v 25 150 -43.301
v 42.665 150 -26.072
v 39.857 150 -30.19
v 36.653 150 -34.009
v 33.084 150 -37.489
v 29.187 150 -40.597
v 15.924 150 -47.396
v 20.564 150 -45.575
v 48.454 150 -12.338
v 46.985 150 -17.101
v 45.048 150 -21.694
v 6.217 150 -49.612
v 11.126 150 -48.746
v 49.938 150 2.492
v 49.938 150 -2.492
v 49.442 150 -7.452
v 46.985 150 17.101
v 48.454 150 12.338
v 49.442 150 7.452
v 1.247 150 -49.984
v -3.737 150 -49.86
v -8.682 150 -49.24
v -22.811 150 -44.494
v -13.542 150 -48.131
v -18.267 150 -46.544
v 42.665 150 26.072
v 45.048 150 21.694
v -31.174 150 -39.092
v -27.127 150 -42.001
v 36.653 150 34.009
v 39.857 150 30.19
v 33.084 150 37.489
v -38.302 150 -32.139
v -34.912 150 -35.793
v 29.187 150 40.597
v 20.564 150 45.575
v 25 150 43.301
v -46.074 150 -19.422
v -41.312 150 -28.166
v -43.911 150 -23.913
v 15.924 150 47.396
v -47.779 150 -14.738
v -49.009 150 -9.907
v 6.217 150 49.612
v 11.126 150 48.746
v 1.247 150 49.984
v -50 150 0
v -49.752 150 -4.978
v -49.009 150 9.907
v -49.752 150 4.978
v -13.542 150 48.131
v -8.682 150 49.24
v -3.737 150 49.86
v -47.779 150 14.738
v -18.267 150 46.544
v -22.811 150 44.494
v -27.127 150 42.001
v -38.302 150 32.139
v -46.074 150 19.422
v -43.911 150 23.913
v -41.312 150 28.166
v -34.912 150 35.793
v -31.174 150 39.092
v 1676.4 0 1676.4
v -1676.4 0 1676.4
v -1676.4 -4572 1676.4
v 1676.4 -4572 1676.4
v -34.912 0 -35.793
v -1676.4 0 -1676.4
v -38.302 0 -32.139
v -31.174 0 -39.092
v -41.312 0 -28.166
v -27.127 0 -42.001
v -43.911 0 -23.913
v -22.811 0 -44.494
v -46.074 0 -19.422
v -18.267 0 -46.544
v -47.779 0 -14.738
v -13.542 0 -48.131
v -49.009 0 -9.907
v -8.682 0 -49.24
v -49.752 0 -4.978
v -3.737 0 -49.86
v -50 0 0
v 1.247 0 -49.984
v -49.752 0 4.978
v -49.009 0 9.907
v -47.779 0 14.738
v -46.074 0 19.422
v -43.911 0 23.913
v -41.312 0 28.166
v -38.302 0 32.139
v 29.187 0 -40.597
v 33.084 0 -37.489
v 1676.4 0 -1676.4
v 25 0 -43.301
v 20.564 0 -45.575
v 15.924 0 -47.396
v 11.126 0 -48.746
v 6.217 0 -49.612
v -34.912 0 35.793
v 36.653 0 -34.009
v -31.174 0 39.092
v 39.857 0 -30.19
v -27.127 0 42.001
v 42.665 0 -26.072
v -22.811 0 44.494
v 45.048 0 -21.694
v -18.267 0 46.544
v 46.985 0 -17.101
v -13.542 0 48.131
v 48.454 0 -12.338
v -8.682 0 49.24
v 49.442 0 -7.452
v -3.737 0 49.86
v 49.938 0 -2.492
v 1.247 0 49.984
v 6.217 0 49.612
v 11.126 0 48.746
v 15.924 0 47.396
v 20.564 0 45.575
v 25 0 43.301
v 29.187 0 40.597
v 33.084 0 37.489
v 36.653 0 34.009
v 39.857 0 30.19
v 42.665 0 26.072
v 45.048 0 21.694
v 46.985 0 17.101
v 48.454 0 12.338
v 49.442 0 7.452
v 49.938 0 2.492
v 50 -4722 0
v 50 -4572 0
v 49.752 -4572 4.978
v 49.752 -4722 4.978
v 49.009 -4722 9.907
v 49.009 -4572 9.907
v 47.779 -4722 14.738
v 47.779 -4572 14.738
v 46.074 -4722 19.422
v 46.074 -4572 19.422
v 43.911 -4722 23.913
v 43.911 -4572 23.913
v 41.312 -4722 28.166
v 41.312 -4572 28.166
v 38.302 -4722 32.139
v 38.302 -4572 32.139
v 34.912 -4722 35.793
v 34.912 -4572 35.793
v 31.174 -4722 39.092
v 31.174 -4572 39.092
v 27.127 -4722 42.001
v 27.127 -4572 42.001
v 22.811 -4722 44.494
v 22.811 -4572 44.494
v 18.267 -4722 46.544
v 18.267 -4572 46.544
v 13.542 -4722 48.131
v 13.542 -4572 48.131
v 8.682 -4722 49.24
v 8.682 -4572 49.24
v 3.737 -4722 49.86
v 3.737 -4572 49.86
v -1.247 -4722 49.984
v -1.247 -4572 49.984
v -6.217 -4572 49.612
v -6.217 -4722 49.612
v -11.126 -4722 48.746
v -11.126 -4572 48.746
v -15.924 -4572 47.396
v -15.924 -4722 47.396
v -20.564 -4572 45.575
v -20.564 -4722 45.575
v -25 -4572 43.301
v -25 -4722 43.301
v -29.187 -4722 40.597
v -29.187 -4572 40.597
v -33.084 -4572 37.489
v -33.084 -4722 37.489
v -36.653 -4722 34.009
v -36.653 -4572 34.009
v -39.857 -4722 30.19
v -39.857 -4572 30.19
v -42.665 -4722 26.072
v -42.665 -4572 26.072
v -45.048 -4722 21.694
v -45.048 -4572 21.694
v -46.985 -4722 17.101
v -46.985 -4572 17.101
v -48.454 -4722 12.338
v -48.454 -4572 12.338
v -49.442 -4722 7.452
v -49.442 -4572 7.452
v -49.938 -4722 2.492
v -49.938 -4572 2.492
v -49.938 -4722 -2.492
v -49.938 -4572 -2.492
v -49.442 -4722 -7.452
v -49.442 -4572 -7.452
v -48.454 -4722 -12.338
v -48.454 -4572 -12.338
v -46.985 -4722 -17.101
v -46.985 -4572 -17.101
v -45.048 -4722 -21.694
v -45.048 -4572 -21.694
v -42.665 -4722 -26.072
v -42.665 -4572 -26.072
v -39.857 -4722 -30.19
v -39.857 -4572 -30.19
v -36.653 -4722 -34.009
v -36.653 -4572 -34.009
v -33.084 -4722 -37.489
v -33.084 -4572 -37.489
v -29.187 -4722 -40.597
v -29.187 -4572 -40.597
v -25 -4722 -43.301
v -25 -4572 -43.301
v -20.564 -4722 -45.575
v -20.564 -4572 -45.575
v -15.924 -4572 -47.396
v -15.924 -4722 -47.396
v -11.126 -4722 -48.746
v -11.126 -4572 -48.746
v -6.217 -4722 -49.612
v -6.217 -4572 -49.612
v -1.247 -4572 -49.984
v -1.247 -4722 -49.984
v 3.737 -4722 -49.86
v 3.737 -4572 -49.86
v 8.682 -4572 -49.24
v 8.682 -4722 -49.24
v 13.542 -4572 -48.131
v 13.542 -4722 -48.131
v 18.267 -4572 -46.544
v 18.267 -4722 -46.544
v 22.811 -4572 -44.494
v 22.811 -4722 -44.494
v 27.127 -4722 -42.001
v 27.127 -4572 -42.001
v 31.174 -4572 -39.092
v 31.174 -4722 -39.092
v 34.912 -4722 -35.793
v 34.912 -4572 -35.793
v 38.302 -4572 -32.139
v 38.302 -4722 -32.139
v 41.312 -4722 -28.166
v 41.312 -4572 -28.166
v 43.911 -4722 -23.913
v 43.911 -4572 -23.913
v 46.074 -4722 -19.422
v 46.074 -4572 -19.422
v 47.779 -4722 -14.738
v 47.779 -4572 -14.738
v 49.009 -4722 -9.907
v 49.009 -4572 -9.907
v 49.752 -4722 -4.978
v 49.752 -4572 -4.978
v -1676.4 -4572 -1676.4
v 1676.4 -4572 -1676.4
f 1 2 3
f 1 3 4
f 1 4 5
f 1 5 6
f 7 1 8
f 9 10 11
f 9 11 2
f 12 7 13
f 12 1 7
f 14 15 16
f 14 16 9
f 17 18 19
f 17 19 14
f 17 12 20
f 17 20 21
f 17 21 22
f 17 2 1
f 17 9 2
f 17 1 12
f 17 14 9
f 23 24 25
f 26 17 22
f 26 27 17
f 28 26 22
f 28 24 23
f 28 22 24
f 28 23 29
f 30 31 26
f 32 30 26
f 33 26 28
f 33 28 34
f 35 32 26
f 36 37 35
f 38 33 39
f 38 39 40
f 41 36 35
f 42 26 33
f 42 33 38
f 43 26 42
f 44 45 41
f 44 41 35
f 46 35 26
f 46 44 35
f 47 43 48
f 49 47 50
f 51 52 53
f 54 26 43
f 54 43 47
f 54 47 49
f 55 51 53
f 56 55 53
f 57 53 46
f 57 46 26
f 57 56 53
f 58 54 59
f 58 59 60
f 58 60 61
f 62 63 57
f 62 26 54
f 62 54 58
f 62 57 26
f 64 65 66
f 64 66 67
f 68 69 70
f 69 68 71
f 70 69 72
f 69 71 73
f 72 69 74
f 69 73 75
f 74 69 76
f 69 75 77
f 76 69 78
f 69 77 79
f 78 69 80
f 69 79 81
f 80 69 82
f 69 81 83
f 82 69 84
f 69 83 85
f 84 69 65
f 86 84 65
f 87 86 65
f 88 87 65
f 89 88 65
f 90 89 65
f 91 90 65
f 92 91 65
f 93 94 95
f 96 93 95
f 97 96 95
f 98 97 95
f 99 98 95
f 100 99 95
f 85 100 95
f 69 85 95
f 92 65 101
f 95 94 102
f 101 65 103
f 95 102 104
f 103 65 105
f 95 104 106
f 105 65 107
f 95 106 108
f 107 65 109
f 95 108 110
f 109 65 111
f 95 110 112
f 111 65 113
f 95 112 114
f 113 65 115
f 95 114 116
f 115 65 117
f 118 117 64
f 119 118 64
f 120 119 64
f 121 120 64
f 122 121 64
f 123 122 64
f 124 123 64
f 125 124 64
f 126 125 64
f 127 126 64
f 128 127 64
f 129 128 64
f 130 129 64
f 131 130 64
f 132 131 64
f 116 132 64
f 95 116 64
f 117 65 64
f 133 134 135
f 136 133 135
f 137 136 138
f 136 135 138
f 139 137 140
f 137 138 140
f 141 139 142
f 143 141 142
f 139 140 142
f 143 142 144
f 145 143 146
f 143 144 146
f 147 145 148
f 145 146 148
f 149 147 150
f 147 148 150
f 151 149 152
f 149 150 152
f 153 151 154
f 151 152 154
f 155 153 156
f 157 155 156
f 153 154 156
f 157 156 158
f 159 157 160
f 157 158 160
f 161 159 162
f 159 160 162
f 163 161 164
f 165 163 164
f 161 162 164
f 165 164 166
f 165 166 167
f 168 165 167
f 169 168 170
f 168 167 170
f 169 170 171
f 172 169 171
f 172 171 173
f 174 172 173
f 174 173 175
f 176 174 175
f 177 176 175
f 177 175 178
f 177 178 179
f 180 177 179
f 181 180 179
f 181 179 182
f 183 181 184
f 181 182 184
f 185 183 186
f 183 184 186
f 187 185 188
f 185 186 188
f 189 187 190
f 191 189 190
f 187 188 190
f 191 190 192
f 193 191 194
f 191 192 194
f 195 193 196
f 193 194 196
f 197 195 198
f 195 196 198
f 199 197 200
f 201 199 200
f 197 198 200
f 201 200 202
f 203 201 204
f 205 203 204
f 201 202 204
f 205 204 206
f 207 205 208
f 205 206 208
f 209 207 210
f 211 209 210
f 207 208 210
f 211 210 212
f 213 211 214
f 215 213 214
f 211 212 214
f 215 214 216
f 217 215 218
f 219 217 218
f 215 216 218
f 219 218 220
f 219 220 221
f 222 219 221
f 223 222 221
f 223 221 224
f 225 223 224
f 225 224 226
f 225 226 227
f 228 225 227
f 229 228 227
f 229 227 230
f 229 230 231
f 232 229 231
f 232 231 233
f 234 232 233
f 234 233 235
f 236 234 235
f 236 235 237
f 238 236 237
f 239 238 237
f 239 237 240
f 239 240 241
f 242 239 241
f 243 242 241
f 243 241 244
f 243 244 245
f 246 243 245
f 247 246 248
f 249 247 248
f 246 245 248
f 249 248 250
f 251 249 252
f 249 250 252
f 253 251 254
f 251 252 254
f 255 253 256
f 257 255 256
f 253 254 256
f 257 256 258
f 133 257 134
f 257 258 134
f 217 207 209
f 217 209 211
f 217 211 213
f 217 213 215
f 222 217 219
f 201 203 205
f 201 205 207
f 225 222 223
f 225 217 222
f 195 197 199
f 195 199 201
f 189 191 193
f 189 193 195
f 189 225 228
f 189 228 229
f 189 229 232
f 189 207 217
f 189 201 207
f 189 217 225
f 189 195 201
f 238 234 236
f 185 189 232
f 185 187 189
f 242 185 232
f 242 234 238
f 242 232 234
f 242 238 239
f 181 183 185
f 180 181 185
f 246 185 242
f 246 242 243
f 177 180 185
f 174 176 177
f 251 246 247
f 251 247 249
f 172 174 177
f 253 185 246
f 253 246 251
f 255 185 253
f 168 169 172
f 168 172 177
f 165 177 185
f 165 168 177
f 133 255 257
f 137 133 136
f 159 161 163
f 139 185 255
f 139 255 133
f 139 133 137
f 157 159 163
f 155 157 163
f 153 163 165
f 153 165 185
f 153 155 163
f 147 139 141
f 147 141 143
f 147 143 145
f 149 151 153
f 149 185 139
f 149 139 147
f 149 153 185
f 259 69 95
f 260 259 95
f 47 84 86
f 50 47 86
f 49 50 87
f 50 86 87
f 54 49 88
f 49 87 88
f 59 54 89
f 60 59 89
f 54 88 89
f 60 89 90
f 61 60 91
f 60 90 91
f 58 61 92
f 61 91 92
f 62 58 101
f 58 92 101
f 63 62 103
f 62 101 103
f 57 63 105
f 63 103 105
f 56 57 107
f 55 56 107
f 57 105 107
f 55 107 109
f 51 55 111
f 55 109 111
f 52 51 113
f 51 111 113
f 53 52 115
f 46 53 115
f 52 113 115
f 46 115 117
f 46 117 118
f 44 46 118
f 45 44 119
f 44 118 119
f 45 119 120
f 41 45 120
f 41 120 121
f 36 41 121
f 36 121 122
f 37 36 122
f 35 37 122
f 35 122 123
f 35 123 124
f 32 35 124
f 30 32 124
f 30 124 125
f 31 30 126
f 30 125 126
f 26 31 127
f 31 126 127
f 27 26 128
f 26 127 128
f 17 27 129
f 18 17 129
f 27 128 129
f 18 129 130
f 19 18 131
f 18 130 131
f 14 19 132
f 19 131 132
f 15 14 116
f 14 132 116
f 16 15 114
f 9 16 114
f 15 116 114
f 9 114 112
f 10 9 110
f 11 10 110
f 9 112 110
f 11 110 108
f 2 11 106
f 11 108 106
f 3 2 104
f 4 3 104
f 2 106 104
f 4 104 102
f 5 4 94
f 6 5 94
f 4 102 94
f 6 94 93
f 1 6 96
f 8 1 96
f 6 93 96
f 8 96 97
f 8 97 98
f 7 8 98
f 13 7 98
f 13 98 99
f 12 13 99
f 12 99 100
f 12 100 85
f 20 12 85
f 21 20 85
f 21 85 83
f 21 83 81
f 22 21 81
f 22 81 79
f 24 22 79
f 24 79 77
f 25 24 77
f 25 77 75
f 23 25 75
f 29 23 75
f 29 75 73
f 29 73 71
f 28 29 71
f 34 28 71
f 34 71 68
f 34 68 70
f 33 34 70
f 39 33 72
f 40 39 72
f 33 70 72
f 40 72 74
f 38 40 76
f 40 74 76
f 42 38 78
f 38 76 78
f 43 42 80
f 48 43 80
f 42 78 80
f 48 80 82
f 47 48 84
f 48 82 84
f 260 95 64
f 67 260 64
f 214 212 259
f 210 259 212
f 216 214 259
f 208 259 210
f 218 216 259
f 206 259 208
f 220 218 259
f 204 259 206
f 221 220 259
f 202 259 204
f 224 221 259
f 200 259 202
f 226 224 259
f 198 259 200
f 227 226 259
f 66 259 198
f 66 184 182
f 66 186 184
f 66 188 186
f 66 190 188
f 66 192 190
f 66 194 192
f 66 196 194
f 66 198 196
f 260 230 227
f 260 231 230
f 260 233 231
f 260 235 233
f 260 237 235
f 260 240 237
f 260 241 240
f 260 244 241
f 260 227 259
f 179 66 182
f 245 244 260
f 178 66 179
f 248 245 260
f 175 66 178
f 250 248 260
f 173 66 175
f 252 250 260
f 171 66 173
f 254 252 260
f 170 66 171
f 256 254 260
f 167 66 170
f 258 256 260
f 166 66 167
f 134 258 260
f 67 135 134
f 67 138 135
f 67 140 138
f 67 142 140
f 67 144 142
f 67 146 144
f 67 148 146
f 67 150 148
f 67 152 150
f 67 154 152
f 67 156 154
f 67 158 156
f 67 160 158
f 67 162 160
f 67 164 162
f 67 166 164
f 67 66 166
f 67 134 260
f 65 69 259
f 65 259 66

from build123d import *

# Parameters (mm, degrees)
F0_W     = 3352.8
F0_H     = 3352.8
F1_DEPTH = 4572
F2_R     = 50
F3_DEPTH = 150
F4_R     = 50
F5_DEPTH = 150


with BuildPart() as f1:
    # F0 (on Front) → F1 (new body)
    with BuildSketch(Plane.XZ):
        Rectangle(F0_W, F0_H)
    extrude(amount=F1_DEPTH)

    # F2 (on face) → F3 (join)
    with BuildSketch(Plane(origin=(0, 0, 0), x_dir=(-1, 0, 0), z_dir=(0, 1, 0))):
        Circle(F2_R)
    extrude(amount=F3_DEPTH)

    # F4 (on face) → F5 (join)
    with BuildSketch(Plane.XZ.offset(4572)):
        Circle(F4_R)
    extrude(amount=F5_DEPTH)


solid = f1.part
